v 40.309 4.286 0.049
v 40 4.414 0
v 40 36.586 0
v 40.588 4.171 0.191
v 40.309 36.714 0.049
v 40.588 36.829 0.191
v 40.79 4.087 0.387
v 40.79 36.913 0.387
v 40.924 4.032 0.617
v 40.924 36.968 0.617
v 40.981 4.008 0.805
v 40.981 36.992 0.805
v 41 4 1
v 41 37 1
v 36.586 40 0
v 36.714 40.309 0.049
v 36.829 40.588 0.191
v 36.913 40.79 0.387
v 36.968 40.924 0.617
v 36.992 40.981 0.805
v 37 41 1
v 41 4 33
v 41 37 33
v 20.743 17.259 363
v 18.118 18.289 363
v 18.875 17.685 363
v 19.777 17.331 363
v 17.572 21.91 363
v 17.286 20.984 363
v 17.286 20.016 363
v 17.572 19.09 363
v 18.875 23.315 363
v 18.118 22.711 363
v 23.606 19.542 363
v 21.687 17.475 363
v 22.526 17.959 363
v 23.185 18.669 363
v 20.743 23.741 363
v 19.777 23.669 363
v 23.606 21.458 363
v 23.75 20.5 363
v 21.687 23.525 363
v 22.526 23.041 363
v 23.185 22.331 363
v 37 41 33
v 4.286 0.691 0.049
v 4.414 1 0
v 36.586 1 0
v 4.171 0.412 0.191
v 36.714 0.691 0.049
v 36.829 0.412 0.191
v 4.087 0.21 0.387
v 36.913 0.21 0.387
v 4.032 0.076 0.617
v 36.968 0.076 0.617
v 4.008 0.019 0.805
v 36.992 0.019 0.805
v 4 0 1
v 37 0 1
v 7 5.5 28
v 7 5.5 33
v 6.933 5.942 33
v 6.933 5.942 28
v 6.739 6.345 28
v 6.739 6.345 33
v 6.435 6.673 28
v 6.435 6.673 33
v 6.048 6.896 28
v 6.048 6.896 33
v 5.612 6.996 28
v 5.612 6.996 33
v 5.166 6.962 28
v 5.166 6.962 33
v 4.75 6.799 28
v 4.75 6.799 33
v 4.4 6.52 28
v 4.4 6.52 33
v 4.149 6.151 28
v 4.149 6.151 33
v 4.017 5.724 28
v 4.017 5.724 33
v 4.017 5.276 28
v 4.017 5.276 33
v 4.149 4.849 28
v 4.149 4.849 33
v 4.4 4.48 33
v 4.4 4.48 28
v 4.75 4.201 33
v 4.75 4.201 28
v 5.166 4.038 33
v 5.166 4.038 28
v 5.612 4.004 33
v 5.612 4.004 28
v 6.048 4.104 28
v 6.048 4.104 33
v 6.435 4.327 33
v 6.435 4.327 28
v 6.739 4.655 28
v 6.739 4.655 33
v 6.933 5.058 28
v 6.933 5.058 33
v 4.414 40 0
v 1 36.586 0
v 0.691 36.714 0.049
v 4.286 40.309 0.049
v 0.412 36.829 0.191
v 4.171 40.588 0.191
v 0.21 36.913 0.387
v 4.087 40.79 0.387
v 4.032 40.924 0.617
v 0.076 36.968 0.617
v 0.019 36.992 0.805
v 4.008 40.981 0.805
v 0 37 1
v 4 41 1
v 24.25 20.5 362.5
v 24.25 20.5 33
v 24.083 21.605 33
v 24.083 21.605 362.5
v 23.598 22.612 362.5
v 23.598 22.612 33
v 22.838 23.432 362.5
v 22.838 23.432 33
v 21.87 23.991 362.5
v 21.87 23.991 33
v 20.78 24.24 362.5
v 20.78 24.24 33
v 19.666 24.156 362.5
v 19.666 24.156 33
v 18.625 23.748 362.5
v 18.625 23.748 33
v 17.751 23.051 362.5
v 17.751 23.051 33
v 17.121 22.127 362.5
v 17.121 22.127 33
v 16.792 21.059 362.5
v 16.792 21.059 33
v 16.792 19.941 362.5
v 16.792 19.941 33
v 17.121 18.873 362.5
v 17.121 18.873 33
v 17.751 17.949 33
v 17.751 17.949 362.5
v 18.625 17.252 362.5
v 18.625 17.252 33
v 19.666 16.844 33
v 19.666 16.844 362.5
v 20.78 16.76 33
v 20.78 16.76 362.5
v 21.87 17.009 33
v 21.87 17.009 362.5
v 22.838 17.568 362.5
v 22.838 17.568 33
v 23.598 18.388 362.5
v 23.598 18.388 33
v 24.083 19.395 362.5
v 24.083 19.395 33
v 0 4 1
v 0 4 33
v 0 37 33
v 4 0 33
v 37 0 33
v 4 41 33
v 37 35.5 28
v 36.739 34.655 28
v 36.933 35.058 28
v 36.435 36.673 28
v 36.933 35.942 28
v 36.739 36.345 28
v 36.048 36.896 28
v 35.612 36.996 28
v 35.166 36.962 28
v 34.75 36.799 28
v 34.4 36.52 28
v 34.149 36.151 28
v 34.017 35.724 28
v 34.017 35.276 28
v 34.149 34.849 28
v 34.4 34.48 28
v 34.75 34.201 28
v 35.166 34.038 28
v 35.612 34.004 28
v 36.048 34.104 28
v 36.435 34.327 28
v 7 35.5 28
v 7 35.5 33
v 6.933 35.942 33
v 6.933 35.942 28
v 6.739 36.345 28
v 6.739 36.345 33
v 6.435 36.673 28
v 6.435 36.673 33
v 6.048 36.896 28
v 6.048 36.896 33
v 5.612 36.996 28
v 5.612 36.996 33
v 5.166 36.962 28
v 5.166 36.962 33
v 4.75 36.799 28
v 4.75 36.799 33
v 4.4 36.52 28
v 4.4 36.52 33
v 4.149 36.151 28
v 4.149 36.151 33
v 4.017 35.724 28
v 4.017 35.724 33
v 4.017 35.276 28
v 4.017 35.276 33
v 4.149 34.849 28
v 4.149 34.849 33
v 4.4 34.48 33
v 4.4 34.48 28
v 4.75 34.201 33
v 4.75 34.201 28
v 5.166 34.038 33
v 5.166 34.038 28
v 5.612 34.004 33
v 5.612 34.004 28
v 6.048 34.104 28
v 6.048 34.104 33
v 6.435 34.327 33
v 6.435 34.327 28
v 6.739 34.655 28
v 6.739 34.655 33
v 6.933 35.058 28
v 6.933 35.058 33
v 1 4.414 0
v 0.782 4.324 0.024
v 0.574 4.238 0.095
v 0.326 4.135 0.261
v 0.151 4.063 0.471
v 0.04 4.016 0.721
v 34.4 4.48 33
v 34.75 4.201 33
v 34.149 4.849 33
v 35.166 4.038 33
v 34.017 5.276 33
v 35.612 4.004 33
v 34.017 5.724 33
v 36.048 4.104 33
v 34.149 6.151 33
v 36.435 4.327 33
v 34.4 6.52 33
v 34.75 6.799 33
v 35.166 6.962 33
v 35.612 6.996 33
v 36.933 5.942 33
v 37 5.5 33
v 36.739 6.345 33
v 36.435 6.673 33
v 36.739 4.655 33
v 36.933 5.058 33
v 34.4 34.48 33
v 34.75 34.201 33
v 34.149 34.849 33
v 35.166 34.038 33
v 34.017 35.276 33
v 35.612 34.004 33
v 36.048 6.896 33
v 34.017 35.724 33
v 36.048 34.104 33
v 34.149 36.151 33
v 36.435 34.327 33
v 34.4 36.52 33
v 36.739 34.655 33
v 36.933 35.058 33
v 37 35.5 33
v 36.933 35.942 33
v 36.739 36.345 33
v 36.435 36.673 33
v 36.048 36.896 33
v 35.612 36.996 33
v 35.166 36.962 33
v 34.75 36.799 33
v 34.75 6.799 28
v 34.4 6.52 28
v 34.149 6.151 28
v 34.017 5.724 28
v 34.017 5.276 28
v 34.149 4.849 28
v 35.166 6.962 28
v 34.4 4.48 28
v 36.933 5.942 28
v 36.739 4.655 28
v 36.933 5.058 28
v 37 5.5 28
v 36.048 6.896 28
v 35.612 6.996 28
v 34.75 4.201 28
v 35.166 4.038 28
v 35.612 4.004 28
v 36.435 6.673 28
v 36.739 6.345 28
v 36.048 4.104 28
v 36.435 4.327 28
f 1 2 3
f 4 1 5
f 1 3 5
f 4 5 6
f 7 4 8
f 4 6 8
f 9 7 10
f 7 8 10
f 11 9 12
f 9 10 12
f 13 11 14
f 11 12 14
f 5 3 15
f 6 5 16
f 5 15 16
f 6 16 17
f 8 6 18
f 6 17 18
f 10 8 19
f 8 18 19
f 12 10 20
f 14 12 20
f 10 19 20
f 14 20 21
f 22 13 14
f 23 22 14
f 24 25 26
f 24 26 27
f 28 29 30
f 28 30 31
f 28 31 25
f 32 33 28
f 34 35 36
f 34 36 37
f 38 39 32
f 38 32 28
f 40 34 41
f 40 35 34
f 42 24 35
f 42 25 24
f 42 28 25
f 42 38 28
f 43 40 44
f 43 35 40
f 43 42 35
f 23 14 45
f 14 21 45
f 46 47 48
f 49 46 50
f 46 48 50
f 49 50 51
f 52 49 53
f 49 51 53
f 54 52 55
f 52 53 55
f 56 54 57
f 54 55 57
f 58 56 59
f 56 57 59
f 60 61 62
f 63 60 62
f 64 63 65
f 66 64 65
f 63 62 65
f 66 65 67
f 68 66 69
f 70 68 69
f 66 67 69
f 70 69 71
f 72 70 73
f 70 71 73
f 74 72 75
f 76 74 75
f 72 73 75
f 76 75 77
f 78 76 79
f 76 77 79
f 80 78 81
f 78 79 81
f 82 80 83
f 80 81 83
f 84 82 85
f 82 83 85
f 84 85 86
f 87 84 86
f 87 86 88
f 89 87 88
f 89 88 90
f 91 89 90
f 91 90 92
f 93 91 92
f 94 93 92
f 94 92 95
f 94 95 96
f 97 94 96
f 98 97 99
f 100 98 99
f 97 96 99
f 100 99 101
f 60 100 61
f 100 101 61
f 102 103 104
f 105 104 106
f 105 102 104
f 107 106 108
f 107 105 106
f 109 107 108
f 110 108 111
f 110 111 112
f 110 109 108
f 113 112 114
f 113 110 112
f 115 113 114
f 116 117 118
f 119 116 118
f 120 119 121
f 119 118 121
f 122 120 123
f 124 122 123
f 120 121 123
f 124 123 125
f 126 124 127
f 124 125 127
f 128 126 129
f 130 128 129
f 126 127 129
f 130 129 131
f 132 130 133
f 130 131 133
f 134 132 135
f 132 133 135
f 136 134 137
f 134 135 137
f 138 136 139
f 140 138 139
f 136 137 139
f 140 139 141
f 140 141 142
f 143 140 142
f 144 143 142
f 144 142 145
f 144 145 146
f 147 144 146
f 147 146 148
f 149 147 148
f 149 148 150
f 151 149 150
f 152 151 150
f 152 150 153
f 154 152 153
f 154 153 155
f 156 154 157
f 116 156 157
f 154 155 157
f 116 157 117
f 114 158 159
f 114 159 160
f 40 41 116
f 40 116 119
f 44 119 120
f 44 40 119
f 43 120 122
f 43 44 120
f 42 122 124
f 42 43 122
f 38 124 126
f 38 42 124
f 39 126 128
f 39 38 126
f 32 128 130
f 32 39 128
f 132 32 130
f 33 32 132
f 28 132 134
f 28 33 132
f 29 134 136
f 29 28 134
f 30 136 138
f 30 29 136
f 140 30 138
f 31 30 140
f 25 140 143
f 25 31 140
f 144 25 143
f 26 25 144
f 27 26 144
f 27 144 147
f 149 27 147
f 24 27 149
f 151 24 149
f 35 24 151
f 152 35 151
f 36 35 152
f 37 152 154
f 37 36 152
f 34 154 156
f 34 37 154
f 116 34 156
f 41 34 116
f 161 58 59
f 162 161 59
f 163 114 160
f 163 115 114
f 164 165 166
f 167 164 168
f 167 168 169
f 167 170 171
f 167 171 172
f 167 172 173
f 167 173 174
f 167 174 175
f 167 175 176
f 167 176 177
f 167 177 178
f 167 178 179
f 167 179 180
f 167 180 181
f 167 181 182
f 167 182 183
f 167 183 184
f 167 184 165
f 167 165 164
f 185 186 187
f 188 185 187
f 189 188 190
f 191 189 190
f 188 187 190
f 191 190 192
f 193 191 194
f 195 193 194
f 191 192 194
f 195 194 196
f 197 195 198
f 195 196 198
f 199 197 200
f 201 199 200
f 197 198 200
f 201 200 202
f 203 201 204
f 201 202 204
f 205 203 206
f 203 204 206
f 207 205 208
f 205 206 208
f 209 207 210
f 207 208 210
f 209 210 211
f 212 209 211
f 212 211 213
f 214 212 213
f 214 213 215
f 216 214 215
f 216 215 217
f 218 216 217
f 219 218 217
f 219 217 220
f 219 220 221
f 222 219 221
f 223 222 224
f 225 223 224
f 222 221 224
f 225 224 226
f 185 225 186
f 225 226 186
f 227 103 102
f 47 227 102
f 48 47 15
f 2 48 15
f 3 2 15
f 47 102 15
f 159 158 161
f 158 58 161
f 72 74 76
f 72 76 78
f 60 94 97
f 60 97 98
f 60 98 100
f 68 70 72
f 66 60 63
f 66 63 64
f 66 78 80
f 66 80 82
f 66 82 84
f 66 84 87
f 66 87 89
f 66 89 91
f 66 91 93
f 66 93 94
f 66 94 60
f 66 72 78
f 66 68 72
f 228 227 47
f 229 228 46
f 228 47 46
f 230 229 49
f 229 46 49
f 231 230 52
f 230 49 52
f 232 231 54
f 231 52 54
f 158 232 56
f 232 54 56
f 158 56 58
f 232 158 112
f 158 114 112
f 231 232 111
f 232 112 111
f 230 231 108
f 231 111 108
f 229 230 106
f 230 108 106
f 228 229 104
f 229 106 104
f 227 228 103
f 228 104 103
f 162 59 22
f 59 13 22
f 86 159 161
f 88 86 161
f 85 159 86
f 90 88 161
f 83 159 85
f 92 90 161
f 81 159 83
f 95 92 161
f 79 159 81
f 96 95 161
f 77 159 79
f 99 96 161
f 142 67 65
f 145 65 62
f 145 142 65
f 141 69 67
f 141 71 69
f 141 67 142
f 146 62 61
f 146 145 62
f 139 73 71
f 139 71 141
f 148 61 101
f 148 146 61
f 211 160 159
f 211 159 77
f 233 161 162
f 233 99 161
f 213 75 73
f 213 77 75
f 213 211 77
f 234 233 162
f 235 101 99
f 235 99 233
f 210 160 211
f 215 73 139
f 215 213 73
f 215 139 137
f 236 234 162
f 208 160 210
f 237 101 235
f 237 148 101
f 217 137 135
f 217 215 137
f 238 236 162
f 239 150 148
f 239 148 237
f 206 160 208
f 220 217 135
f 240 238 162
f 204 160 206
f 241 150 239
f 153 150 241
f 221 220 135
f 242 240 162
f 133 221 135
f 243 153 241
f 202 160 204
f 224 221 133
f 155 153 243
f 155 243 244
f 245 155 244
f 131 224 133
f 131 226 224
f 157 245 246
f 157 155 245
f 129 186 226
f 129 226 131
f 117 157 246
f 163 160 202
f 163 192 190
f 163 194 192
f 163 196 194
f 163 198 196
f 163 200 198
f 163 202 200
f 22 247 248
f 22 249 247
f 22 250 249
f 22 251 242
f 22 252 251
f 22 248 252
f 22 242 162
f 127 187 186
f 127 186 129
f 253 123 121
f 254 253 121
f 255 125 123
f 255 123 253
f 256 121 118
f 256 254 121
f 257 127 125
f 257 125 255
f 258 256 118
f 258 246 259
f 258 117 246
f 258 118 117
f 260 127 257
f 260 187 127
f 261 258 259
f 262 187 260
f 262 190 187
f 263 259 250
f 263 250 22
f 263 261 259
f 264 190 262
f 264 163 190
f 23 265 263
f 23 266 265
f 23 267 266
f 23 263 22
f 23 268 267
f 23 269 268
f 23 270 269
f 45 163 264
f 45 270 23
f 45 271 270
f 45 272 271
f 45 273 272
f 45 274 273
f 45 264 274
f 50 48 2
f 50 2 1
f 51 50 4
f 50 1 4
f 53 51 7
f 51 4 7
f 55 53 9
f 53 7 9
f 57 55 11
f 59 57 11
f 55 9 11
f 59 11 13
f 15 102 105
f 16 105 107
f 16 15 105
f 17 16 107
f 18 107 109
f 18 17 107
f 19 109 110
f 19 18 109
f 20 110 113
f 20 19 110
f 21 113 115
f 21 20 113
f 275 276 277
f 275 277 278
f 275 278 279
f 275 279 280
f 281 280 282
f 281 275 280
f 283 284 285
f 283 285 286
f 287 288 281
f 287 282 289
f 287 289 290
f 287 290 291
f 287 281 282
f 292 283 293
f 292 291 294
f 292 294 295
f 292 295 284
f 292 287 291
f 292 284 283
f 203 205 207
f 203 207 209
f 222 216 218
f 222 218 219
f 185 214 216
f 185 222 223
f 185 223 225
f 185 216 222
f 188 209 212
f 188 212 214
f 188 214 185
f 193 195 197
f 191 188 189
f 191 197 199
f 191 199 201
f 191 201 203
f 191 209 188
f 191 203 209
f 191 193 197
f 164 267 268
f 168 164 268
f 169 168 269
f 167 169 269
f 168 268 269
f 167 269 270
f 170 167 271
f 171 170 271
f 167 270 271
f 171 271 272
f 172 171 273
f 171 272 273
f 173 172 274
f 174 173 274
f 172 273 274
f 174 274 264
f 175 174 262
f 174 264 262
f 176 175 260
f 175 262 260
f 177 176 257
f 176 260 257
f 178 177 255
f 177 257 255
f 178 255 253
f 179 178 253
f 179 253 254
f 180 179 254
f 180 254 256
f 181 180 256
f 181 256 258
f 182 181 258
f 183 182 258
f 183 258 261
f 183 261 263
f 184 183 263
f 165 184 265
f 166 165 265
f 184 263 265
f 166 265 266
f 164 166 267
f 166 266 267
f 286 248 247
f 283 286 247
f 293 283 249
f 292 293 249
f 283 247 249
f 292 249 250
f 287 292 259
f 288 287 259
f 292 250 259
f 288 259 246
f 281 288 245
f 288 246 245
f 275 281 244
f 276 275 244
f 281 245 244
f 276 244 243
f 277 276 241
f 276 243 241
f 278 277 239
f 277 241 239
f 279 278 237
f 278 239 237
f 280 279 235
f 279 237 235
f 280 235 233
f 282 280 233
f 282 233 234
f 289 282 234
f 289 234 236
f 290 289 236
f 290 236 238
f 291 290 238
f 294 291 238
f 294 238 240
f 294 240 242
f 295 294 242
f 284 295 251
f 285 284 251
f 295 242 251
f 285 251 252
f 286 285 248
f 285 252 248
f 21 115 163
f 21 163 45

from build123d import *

# Parameters (mm, degrees)
SKETCH_W        = 41
SKETCH_H        = 41
PAD_DEPTH       = 33
CHAMFER_SIZE    = 4
FILLET_R        = 1
SKETCH001_R     = 1.5
POCKET_DEPTH    = 5
SKETCH002_R     = 3.75
PAD001_DEPTH    = 330
CHAMFER001_SIZE = 0.5


with BuildPart() as part:
    # Sketch → Pad (new body)
    with BuildSketch(Plane.XY):
        with Locations((20.5, 20.5)):
            Rectangle(SKETCH_W, SKETCH_H)
    extrude(amount=PAD_DEPTH)

    # Chamfer
    chamfer_edges = [part.edges().sort_by_distance(p)[0] for p in [
        (41, 0, 16.5),
        (0, 0, 16.5),
        (0, 41, 16.5),
        (41, 41, 16.5),
    ]]
    chamfer(chamfer_edges, length=CHAMFER_SIZE)

    # Fillet
    fillet_edges = [part.edges().sort_by_distance(p)[0] for p in [
        (20.5, 0, 0),
        (39, 2, 0),
        (41, 20.5, 0),
        (39, 39, 0),
        (20.5, 41, 0),
        (2, 39, 0),
        (0, 20.5, 0),
        (2, 2, 0),
    ]]
    fillet(fillet_edges, radius=FILLET_R)

    # Sketch001 (on Face4 of Fillet) → Pocket (cut)
    with BuildSketch(Plane.XY.offset(33)):
        with Locations((35.5, 35.5)):
            Circle(SKETCH001_R)
        with Locations((5.5, 35.5)):
            Circle(SKETCH001_R)
        with Locations((5.5, 5.5)):
            Circle(SKETCH001_R)
        with Locations((35.5, 5.5)):
            Circle(SKETCH001_R)
    extrude(amount=-POCKET_DEPTH, mode=Mode.SUBTRACT)

    # Sketch002 (on Face4 of Pocket) → Pad001 (join)
    with BuildSketch(Plane.XY.offset(33)):
        with Locations((20.5, 20.5)):
            Circle(SKETCH002_R)
    extrude(amount=PAD001_DEPTH)

    # Chamfer001
    chamfer001_edges = [part.edges().sort_by_distance(p)[0] for p in [
        (16.75, 20.5, 363),
    ]]
    chamfer(chamfer001_edges, length=CHAMFER001_SIZE)


solid = part.part
